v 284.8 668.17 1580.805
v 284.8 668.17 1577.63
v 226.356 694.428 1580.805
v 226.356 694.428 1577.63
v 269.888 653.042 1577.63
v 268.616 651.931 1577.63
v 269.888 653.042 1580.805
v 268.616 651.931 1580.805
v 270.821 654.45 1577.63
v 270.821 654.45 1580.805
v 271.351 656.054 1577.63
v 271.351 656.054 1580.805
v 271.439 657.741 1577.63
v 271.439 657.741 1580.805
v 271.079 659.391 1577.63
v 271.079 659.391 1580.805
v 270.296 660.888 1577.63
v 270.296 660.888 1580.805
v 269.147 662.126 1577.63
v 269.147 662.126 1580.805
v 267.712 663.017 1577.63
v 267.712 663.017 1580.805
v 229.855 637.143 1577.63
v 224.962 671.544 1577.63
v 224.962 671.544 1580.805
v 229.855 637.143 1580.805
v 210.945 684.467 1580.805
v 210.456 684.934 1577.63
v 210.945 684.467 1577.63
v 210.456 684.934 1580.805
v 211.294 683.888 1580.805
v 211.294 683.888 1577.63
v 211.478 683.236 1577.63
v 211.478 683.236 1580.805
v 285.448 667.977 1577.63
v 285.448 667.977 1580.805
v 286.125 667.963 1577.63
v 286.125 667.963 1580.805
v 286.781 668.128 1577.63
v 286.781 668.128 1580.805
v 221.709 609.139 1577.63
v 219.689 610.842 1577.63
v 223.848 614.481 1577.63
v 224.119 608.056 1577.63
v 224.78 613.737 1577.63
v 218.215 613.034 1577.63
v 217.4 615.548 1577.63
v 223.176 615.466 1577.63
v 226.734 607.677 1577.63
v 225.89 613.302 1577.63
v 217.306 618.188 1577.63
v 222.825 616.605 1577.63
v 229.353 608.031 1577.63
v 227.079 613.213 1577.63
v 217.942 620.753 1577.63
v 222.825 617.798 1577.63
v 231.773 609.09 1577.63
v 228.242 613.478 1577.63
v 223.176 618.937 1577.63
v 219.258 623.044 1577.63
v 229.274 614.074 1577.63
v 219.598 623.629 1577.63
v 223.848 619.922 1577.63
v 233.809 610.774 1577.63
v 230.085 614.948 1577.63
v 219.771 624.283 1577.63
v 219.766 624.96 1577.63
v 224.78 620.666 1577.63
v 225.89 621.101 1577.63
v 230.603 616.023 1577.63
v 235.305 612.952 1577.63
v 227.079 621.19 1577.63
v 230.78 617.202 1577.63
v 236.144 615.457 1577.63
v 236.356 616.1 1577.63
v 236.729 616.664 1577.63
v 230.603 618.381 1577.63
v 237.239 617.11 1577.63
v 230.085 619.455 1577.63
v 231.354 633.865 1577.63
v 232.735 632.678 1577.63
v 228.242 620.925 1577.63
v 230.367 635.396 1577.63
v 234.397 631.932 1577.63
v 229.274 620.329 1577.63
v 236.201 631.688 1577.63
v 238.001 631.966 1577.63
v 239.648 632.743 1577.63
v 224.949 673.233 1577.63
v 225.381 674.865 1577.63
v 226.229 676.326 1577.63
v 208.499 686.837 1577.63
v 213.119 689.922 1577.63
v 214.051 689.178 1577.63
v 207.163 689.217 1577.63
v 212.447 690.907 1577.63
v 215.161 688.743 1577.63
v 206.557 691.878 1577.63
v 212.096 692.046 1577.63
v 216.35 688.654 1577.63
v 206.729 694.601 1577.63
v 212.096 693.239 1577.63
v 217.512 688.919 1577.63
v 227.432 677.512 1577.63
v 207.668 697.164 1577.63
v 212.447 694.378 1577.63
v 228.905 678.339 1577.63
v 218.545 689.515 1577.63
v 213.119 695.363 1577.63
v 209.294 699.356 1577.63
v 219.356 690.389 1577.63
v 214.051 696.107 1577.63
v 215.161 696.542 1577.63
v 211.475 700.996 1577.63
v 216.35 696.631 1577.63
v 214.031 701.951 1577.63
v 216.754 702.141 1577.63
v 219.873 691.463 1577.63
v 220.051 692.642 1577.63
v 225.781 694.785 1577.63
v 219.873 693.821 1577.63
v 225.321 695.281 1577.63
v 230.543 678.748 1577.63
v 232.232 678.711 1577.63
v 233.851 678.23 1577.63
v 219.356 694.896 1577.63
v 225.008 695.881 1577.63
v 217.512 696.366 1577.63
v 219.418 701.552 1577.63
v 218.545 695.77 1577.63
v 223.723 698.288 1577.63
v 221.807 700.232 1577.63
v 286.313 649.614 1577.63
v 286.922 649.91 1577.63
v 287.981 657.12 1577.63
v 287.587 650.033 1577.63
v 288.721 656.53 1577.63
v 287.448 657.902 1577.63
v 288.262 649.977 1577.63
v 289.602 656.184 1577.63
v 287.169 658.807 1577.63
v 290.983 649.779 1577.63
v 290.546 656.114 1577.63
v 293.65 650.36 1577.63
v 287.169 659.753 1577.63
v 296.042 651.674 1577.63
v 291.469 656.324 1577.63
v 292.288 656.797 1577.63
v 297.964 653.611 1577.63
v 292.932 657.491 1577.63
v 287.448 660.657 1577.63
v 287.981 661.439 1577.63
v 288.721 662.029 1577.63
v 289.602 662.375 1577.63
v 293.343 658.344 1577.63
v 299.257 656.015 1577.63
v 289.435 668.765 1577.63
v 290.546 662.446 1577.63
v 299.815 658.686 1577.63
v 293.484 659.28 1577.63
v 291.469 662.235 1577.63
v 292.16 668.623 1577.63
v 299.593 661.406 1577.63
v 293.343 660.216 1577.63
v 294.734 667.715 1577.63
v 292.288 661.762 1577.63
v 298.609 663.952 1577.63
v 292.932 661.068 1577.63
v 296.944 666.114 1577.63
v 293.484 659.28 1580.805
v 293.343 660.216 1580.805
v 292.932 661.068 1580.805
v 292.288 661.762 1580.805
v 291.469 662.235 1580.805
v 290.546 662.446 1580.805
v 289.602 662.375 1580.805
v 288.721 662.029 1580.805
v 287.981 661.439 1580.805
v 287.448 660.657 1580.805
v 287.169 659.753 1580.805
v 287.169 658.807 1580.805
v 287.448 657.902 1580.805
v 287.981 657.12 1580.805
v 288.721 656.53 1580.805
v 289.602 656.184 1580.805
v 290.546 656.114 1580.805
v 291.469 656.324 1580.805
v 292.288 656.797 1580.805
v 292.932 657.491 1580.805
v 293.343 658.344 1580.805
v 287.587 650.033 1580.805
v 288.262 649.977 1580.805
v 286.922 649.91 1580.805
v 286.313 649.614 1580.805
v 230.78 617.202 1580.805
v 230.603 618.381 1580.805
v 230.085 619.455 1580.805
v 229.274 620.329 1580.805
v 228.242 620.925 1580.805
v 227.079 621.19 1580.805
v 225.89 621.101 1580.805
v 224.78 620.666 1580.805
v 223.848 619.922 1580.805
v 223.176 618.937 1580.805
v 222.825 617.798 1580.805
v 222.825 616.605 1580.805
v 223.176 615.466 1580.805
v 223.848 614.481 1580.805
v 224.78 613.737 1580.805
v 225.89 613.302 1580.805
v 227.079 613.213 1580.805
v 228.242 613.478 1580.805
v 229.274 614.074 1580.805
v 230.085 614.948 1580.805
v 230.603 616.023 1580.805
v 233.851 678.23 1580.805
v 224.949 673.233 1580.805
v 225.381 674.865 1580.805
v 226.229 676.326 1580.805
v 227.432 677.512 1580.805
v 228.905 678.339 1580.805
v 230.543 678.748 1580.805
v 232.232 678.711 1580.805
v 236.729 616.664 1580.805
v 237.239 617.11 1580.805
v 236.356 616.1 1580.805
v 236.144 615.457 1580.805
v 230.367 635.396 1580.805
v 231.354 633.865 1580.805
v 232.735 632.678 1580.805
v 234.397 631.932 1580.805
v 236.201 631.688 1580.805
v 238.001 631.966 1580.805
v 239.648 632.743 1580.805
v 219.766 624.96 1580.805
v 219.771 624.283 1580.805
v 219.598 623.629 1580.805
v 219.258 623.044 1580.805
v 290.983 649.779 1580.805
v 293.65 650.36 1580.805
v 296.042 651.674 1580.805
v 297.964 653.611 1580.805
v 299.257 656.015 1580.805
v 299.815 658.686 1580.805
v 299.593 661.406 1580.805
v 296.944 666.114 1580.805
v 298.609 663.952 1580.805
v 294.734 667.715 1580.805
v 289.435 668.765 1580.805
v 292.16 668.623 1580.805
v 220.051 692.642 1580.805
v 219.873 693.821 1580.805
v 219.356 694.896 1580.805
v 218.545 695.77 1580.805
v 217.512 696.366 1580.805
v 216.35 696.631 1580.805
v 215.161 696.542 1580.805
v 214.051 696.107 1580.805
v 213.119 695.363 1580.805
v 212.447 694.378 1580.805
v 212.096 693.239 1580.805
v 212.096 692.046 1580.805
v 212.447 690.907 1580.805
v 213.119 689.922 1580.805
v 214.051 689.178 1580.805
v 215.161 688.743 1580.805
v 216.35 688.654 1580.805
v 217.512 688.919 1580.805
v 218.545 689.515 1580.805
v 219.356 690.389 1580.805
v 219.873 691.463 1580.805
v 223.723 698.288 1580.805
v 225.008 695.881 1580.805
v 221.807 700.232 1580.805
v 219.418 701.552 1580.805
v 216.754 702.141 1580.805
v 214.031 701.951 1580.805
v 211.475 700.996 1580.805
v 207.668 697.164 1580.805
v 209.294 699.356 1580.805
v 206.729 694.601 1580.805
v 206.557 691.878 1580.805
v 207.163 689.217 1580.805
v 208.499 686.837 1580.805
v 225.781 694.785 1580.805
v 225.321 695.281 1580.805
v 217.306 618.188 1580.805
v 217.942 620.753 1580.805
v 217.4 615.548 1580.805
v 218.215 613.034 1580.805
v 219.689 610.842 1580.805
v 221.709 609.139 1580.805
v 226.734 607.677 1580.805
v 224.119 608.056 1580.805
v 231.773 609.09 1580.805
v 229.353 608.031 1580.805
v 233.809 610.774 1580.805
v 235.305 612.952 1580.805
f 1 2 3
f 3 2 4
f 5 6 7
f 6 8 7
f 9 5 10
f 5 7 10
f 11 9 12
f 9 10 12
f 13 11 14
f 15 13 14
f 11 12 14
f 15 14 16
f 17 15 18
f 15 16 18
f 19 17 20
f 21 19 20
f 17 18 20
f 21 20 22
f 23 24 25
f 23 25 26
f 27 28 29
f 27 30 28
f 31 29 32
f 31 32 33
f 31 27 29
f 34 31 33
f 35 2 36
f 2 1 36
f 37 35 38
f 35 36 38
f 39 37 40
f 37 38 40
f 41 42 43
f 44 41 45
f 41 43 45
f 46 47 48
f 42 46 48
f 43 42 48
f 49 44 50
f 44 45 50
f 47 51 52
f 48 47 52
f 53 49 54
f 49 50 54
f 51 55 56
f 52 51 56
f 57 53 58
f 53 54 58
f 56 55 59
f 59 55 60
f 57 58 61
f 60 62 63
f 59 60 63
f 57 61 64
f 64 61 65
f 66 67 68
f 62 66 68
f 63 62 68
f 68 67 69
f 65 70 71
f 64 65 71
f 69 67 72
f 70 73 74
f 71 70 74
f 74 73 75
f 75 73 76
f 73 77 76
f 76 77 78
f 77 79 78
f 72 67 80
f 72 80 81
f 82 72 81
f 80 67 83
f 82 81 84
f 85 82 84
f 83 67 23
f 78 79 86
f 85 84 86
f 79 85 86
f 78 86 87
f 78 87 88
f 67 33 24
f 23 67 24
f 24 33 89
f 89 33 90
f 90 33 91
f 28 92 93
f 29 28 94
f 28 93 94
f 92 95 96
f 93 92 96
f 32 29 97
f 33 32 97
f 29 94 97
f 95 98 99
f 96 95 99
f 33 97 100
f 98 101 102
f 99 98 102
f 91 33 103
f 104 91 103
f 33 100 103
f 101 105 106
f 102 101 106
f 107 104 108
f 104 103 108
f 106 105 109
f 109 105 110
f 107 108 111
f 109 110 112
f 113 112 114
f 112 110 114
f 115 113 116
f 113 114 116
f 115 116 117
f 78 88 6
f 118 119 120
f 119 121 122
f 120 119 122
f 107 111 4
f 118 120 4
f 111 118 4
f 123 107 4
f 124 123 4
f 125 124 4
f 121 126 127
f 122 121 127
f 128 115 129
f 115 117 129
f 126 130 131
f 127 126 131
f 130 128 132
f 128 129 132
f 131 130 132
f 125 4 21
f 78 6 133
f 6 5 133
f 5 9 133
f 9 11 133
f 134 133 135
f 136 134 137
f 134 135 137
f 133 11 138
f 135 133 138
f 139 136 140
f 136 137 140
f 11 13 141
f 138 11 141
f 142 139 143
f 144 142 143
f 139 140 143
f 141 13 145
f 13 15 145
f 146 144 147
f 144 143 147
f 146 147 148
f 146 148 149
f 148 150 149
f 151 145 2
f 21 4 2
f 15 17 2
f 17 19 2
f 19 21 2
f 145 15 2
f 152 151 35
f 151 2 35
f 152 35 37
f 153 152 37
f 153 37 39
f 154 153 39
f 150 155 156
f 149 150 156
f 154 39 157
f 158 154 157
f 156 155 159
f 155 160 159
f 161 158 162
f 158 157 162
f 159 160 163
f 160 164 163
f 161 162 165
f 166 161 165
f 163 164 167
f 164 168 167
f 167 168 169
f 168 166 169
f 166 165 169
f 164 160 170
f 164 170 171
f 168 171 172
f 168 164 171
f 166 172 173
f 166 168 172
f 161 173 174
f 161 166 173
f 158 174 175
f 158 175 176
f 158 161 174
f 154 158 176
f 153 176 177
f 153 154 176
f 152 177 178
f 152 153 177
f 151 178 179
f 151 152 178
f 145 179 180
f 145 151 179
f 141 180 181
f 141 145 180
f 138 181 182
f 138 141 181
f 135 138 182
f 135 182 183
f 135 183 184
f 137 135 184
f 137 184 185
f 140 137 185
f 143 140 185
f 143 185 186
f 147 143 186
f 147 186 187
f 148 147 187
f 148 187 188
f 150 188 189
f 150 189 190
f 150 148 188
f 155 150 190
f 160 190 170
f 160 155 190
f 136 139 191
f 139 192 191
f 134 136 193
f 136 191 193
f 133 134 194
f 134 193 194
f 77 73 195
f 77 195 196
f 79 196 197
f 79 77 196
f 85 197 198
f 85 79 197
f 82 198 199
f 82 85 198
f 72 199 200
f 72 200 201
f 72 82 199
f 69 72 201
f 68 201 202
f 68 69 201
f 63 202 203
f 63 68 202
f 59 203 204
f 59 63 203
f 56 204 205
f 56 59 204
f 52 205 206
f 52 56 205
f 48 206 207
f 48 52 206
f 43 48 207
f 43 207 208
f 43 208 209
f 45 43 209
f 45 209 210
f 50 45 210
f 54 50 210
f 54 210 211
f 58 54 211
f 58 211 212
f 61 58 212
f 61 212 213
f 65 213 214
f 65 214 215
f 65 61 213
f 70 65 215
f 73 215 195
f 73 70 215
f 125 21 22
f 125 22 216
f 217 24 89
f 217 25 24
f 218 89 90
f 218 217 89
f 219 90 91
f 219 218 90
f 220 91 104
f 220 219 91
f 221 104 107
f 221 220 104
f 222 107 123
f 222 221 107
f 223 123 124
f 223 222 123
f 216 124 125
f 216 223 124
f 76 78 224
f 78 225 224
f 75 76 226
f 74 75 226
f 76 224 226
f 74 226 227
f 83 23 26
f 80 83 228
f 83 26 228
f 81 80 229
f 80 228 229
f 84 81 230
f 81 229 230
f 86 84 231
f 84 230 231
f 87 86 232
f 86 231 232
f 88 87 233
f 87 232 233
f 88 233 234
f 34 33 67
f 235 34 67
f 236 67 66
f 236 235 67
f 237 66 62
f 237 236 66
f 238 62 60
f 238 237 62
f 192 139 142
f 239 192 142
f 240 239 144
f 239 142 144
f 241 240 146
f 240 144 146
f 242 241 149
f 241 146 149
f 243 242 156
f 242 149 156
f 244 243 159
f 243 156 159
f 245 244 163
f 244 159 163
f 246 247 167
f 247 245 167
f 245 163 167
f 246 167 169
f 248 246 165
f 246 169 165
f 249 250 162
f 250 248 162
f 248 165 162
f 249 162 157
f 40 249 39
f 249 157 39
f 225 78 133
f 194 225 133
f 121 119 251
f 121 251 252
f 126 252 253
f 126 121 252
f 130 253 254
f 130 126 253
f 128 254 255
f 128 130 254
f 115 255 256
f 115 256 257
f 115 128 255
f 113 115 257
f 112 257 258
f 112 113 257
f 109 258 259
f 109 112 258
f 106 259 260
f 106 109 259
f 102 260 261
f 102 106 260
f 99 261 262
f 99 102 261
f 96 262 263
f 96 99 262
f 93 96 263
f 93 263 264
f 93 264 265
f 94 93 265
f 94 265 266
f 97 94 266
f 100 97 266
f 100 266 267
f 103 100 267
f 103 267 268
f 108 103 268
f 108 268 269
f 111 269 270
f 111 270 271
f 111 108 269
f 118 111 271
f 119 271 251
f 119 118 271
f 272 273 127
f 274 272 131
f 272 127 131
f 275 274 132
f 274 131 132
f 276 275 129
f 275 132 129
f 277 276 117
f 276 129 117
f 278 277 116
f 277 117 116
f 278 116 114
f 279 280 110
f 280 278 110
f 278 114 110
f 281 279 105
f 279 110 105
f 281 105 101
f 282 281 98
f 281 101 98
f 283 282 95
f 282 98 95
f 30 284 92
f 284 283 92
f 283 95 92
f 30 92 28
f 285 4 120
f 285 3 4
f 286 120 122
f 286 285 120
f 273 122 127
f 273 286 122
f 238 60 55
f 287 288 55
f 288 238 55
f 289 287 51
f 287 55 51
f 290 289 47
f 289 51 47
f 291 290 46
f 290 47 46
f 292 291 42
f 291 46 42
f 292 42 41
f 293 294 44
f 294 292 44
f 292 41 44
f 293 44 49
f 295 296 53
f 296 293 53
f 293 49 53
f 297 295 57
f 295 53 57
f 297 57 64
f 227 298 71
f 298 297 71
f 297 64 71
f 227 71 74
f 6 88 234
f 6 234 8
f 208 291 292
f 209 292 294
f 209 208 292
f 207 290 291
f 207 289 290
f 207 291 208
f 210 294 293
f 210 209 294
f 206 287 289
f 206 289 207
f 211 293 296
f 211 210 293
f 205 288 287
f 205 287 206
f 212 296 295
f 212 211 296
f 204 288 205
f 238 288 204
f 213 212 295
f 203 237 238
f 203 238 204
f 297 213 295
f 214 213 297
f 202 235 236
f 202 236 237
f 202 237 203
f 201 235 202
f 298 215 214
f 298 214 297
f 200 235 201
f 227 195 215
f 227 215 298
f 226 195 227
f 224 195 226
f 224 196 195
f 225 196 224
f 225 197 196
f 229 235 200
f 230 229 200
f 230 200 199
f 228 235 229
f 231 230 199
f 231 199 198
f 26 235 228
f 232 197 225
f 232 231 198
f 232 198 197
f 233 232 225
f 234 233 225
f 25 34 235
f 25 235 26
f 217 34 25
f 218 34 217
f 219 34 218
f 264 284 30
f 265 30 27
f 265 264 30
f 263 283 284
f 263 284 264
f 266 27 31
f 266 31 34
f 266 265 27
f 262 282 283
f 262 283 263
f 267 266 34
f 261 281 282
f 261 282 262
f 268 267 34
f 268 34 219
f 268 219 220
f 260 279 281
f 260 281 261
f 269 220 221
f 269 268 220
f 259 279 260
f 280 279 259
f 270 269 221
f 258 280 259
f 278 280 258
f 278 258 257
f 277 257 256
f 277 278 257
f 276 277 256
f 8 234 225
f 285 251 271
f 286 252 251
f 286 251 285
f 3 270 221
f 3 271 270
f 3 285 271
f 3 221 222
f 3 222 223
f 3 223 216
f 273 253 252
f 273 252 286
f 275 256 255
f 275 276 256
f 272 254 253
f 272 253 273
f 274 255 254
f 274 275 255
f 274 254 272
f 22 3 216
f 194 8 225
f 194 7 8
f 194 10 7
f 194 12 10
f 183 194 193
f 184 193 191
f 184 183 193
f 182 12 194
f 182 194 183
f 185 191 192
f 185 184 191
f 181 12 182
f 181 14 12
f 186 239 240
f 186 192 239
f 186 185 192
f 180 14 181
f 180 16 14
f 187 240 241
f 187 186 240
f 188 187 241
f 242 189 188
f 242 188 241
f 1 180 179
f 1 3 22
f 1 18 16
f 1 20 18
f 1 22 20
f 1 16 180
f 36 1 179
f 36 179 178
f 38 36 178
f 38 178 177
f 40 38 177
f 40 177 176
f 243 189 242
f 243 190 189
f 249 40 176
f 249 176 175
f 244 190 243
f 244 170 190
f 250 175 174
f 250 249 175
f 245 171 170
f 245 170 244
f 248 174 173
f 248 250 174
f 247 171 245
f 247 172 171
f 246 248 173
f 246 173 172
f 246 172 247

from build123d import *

# Parameters (mm, degrees)
BOSS_EXTRUDE1_DEPTH  = 3.175
SKETCH1_4_R          = 4
SKETCH1_4_R_2        = 3.175
HOLES_DEPTH          = 3.175
SKETCH5_OUTSIDE_W    = 151.471
SKETCH5_OUTSIDE_H    = 153.323
OUTSIDEEXTRUDE_DEPTH = 3.81
INNERTRIANGLE_DEPTH  = 3.81
FILLET2_R            = 6.35
FILLET3_R            = 2.54


with BuildPart() as part:
    # Sketch1 → Boss-Extrude1 (new body)
    with BuildSketch(Plane.XY.offset(1577.629912845)):
        Polygon((200.232199361, 713.672399287), (217.036775663, 595.514826781), (316.536854979, 661.418847479), align=None)
    extrude(amount=BOSS_EXTRUDE1_DEPTH)

    # Sketch1<4> → Holes (cut)
    with BuildSketch(Plane.XY.offset(1577.629912845)):
        with Locations((216.050914922, 692.642443937)):
            Circle(SKETCH1_4_R)
        with Locations((290.308718483, 659.279772728)):
            Circle(SKETCH1_4_R_2)
        with Locations((226.780244033, 617.20159627)):
            Circle(SKETCH1_4_R)
    extrude(amount=HOLES_DEPTH, mode=Mode.SUBTRACT)

    # Sketch5 outside → OutsideExtrude (cut)
    with BuildSketch(Plane(origin=(0, 0, 1577.629912845), x_dir=(-1, 0, 0), z_dir=(0, 0, -1))):
        with Locations((-258.3845, 654.5935)):
            Rectangle(SKETCH5_OUTSIDE_W, SKETCH5_OUTSIDE_H)
        with BuildLine():
            Line((-211.315771723, 684.377817887), (-219.928647009, 623.818335891))
            ThreePointArc((-219.928647009, 623.818335891), (-222.876711188, 608.51320998), (-236.277349403, 616.473163308))
            Line((-236.277349403, 616.473163308), (-287.274277772, 650.251052189))
            ThreePointArc((-287.274277772, 650.251052189), (-299.802198055, 660.0540276), (-285.851407356, 667.697492284))
            Line((-285.851407356, 667.697492284), (-225.304484054, 694.900116089))
            ThreePointArc((-225.304484054, 694.900116089), (-210.325206852, 700.25440111), (-211.315771723, 684.377817887))
        make_face(mode=Mode.SUBTRACT)
    extrude(amount=-OUTSIDEEXTRUDE_DEPTH, mode=Mode.SUBTRACT)

    # Sketch6 → InnerTriangle (cut)
    with BuildSketch(Plane(origin=(0, 0, 1577.629912845), x_dir=(-1, 0, 0), z_dir=(0, 0, -1))):
        Polygon((-223.339566396, 682.952655016), (-231.269656883, 627.194019699), (-278.223809028, 658.294169931), align=None)
    extrude(amount=-INNERTRIANGLE_DEPTH, mode=Mode.SUBTRACT)

    # Fillet2
    fillet2_edges = [part.edges().sort_by_distance(p)[0] for p in [
        (278.223809028, 658.294169931, 1579.217412845),
        (223.339566396, 682.952655016, 1579.217412845),
        (231.269656883, 627.194019699, 1579.217412845),
    ]]
    fillet(fillet2_edges, radius=FILLET2_R)

    # Fillet3
    fillet3_edges = [part.edges().sort_by_distance(p)[0] for p in [
        (211.315771723, 684.377817887, 1579.217412845),
        (219.928647009, 623.818335891, 1579.217412845),
        (236.277349403, 616.473163308, 1579.217412845),
        (287.274277772, 650.251052189, 1579.217412845),
        (285.851407356, 667.697492284, 1579.217412845),
        (225.304484054, 694.900116089, 1579.217412845),
    ]]
    fillet(fillet3_edges, radius=FILLET3_R)


solid = part.part
